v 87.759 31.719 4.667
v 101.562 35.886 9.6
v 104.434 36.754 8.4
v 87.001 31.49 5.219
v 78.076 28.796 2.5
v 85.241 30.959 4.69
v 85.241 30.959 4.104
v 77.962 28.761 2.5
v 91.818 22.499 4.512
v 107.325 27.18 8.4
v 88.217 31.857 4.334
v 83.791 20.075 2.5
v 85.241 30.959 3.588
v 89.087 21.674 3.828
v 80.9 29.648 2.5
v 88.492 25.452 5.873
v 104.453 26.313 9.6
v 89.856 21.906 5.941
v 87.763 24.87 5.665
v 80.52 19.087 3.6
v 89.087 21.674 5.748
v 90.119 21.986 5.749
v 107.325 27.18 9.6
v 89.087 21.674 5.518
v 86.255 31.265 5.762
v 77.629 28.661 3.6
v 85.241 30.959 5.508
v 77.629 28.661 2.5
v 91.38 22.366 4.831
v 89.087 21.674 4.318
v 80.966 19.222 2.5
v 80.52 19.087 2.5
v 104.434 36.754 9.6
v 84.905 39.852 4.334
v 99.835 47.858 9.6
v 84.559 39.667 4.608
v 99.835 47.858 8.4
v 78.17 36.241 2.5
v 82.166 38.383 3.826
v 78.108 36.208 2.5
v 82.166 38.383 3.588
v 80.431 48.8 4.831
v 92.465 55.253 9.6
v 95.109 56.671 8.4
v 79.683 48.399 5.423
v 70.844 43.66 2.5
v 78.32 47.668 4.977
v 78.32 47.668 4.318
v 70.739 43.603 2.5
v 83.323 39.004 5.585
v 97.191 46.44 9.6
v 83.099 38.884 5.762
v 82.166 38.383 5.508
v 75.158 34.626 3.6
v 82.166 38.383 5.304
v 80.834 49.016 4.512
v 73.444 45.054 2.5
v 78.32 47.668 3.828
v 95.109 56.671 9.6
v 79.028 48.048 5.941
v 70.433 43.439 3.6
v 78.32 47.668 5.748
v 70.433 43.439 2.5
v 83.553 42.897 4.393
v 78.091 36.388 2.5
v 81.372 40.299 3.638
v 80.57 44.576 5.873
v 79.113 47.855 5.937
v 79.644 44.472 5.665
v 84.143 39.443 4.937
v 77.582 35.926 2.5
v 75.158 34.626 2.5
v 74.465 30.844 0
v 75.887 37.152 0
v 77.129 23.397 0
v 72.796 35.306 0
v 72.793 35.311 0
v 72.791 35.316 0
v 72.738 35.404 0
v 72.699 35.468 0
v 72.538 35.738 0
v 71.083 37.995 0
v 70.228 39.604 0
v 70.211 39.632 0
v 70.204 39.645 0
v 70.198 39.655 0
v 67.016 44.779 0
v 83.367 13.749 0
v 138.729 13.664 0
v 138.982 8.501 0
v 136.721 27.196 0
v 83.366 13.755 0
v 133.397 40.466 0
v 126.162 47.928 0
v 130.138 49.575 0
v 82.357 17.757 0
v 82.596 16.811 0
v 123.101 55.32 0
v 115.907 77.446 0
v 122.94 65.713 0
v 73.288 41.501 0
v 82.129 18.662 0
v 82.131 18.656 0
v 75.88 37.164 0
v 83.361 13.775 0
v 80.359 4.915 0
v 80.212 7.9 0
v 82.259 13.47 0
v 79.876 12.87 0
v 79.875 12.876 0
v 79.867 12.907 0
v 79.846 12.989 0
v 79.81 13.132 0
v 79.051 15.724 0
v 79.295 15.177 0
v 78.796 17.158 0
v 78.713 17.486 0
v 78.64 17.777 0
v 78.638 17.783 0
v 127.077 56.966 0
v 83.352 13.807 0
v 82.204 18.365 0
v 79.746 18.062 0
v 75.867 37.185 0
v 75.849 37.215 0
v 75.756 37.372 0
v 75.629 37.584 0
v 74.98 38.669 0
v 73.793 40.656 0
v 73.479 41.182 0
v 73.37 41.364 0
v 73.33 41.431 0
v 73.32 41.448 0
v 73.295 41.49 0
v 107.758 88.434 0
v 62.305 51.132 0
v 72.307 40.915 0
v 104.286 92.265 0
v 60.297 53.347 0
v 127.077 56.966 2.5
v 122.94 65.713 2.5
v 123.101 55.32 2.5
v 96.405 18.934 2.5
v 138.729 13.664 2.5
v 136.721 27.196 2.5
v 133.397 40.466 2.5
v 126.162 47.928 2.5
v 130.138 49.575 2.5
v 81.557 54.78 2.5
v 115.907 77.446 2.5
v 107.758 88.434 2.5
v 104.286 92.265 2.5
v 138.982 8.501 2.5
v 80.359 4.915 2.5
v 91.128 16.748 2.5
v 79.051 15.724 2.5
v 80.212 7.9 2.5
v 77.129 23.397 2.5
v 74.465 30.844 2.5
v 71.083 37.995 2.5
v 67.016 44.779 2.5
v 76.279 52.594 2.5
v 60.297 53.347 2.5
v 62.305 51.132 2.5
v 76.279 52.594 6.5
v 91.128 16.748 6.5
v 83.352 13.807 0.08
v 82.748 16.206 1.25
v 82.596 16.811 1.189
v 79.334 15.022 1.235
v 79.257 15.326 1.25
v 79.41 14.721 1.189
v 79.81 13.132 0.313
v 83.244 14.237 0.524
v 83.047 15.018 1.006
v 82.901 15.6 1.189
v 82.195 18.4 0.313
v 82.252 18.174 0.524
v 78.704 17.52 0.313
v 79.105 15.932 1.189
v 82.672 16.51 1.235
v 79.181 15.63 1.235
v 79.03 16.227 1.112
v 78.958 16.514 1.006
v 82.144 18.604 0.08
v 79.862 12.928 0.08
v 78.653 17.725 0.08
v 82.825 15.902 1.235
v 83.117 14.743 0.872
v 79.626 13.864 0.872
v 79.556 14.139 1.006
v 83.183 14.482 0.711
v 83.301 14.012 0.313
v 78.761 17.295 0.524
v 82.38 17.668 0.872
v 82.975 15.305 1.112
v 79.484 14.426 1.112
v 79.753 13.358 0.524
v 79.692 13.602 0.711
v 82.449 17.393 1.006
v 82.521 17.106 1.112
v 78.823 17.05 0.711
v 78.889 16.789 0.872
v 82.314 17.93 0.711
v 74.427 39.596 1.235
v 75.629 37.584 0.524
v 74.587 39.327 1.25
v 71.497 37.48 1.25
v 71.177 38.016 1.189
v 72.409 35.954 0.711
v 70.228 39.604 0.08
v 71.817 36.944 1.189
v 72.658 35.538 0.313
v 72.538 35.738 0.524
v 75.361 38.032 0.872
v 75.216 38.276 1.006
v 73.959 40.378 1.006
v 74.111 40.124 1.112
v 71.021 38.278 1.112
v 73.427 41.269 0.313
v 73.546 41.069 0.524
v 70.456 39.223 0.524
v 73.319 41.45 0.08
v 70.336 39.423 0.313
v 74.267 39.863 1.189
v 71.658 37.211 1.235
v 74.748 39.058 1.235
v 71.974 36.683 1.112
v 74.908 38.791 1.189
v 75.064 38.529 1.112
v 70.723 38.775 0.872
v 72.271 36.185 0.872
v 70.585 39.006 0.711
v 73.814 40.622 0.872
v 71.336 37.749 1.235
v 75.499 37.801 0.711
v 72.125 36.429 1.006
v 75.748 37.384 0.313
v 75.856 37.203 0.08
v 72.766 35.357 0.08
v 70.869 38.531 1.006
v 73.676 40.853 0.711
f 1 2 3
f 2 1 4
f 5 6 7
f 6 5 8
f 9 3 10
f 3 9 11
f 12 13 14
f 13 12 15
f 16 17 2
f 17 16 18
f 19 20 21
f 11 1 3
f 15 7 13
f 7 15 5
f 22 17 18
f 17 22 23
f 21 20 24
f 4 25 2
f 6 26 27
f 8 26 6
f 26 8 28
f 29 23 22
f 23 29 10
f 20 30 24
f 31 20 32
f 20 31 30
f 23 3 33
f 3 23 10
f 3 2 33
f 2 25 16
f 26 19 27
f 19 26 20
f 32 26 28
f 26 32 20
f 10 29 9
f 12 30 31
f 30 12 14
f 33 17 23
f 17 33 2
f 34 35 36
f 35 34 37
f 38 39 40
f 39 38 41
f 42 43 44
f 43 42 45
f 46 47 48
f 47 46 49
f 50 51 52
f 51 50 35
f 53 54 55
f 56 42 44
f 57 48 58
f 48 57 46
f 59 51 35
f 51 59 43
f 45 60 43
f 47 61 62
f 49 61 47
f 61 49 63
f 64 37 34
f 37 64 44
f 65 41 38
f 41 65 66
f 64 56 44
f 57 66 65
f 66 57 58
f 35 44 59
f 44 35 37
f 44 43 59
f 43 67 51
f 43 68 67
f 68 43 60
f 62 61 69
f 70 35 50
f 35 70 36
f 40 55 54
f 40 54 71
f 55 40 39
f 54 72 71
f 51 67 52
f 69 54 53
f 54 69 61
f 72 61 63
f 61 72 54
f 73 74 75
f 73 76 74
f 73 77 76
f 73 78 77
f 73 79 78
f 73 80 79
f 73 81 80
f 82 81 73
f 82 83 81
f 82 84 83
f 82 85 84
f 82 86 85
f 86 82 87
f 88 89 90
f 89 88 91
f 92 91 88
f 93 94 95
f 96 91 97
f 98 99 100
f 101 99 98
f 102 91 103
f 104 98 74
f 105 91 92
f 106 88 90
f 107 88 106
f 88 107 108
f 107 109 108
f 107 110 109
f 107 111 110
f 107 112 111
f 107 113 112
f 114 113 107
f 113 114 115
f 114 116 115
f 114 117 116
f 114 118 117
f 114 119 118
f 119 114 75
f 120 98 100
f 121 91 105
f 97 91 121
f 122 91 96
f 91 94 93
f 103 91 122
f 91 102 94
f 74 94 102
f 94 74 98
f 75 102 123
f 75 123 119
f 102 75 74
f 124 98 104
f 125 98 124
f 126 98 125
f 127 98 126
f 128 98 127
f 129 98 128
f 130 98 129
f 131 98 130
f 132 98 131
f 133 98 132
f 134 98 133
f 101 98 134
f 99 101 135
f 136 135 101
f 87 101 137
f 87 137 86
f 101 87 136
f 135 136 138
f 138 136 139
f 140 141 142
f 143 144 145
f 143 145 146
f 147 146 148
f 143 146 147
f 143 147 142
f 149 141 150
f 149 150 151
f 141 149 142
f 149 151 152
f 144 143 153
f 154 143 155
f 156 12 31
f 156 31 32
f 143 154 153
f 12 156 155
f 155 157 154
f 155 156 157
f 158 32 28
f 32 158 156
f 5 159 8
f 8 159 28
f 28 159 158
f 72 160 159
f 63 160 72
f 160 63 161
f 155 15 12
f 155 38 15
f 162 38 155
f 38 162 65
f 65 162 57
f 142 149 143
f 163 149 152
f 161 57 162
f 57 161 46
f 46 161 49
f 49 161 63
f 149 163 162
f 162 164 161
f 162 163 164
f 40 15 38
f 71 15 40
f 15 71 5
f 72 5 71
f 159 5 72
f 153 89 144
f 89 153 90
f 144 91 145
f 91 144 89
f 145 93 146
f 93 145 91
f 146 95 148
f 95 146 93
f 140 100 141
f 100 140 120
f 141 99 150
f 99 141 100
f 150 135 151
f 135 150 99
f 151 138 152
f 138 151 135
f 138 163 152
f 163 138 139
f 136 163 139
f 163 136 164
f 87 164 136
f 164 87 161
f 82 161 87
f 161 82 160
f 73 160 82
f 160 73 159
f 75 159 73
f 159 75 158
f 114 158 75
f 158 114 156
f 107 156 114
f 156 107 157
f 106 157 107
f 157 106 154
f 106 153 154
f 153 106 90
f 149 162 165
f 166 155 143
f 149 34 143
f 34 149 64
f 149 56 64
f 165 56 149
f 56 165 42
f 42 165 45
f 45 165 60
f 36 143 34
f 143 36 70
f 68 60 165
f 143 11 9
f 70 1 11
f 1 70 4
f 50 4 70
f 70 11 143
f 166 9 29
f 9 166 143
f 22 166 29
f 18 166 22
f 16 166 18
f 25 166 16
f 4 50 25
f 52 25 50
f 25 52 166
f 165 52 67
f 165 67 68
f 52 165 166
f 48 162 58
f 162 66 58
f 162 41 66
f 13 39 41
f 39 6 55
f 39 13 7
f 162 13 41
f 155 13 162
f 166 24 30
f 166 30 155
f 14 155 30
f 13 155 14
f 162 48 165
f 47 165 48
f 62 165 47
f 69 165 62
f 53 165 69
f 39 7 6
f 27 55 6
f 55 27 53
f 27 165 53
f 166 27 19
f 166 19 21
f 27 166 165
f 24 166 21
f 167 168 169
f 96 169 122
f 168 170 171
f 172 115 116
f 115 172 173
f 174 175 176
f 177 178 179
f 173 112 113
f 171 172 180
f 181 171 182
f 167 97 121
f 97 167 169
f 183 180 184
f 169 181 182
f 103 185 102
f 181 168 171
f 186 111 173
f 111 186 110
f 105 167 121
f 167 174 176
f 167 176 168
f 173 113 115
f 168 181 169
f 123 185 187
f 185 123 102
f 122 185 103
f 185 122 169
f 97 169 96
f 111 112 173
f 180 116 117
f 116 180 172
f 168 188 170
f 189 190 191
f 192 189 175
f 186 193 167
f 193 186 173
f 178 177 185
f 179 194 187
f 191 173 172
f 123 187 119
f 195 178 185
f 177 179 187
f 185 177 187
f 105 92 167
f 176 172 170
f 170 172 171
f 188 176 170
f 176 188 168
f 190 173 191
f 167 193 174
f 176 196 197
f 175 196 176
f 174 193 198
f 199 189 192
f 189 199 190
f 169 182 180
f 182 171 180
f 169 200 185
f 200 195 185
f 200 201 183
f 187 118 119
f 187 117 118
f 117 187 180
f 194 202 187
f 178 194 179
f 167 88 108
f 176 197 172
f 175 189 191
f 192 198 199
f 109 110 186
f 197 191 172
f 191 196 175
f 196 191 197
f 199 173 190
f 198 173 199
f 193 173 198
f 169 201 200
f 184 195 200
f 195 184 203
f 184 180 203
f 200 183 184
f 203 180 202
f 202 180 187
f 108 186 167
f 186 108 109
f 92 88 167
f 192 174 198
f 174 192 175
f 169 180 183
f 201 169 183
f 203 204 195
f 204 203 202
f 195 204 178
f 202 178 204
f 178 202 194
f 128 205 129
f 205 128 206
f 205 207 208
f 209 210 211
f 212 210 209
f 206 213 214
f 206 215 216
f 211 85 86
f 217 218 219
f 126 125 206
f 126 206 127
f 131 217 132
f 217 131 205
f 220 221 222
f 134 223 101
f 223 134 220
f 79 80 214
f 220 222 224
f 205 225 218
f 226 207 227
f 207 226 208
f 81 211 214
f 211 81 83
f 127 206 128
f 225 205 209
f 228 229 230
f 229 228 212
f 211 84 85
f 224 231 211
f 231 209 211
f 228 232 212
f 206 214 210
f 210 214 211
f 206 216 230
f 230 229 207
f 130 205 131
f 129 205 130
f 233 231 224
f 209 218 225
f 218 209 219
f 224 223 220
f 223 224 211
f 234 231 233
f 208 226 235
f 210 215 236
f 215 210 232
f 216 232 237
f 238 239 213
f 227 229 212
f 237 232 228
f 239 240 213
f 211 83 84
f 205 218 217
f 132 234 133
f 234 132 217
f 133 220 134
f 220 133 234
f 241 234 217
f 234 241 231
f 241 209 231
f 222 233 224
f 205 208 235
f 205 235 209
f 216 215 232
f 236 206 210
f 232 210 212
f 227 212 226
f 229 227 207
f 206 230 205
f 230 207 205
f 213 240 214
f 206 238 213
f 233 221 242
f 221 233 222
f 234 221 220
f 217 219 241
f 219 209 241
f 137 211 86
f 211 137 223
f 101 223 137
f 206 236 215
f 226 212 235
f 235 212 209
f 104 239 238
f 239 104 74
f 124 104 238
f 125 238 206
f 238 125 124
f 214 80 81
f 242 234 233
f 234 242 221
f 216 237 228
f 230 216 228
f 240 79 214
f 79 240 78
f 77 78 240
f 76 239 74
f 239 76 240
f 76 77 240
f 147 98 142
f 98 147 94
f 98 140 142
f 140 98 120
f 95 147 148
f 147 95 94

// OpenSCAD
// ═══════════════════════════════════════════════════════════════════════
//  CowPad — Ejector Platform  ·  V2 Print-in-Place Spring
//  ENGN676  ·  Lincoln University  ·  2026
//
//  PRINTS AS ONE PIECE — no separate spring needed.
//
//  HOW IT WORKS:
//    1. Two leaf spring arms grow from the top face near the inner edge.
//    2. Arms naturally rise 6mm above platform surface (printed at an angle).
//    3. Push platform flat into tile cavity → ceiling compresses arms 2mm
//       → spring loaded (~4 N total force).
//    4. Trigger releases latch → arms spring back → OR edge flips up
//       → cartridge launches toward paddock.
//    5. Next cartridge drops from magazine. Reset manually for demo.
//
//  HINGE: two U-channels hook over pins projecting from tile inner wall.
//  Assembly: angle platform → hook channels over pins → press flat.
//
//  ► PRINT 1 COPY
//  ► Orientation : FLAT FACE DOWN (arms print pointing upward — no supports)
//  ► Layer height : 0.2mm
//  ► Infill       : 25%
//  ► Supports     : NONE
//  ► Material     : PLA  (~15 reliable flex cycles for demo)
//                   PETG preferred if available (100+ cycles)
//  ► Est. time    : ~1 hr
// ═══════════════════════════════════════════════════════════════════════

$fn = 64;

// ── Tile cavity parameters (must match cowpad_tile_arc.scad) ─────────
IR = 75;   OR = 145;   ANG = 45;
BASE_H = 6;   FILL_H = 8;   LID_H = 1.5;
CAV_WALL = 5;   CAV_ANG = 3;
CAV_DEPTH = FILL_H - LID_H;   // 6.5mm usable cavity depth

// ── Platform footprint ───────────────────────────────────────────────
P_IR  = IR  + CAV_WALL + 0.6;   // 80.6
P_OR  = OR  - CAV_WALL - 0.6;   // 139.4
P_A1  = CAV_ANG + 0.5;          // 3.5°
P_A2  = ANG - CAV_ANG - 0.5;    // 41.5°
P_H   = 2.5;                     // base plate thickness

// ── Hinge U-channels ─────────────────────────────────────────────────
HG_D    = 6.4;   // pin Ø + 0.4mm clearance
HG_DEEP = 3.5;
HG_L    = 9;
HG_A    = [P_A1 + (P_A2-P_A1)*0.28, P_A1 + (P_A2-P_A1)*0.72];

// ── Print-in-Place Leaf Spring Arms ──────────────────────────────────
//
//  Arm geometry (side view, IR at left, OR at right):
//
//                                tip ___
//                               /      |  } LEAF_T = 1.2mm
//                         ____/________|
//    base ____           |  arm        |
//    _____|    |__________|_____________|
//    |  platform body P_H = 2.5mm      |
//    |__________________________________|
//    IR edge (hinge)             OR edge
//
//  Base (at P_IR+2) is bonded to platform.
//  Tip (at P_IR+2+LEAF_L) rises LEAF_RISE above platform top.
//  Cavity clearance above platform = CAV_DEPTH - P_H = 4.0mm.
//  LEAF_RISE = 6mm → tip 2mm above ceiling in free state
//  → arm compressed 2mm when installed → ~4 N spring force.
//
LEAF_T    = 1.2;   // arm thickness — printable with 0.4mm nozzle (3 perimeters)
LEAF_W    = 10;    // arm width (arc direction)
LEAF_L    = 25;    // arm radial length (cantilever span)
LEAF_BASE = 3;     // bonded base section length
LEAF_RISE = 6.0;   // tip height above platform top in free state (> 4mm clearance)

// Two arms at 35% and 65% of arc span
LEAF_A = [P_A1 + (P_A2-P_A1)*0.35, P_A1 + (P_A2-P_A1)*0.65];

// ── Latch notch ──────────────────────────────────────────────────────
LT_W   = 8;   LT_H = 4;   LT_D = 3.5;
LT_ANG = (P_A1 + P_A2) / 2;

// ── Launch ramp ───────────────────────────────────────────────────────
RAMP_ANG = 35;
RAMP_H   = 4;
RAMP_W   = P_OR - P_IR - 20;

// ═══════════════════════════════════════════════════════════════════════
// HELPERS
// ═══════════════════════════════════════════════════════════════════════

module pie_2d(r, a1, a2) {
  steps = max(4, ceil(a2 - a1));
  pts = concat([[0,0]],
    [for(i=[0:steps])
      [r*cos(a1 + i*(a2-a1)/steps),
       r*sin(a1 + i*(a2-a1)/steps)]]);
  polygon(pts);
}

module ring_sector_2d(ri, ro, a1, a2) {
  intersection() {
    difference() { circle(ro); circle(ri); }
    pie_2d(ro+1, a1, a2);
  }
}

module ring_sector(ri, ro, a1, a2, h) {
  linear_extrude(h) ring_sector_2d(ri, ro, a1, a2);
}

// ═══════════════════════════════════════════════════════════════════════
// HINGE U-CHANNELS
// Cut into inner radius edge of platform — hook over tile hinge pins.
// ═══════════════════════════════════════════════════════════════════════

module hinge_channels() {
  for(a = HG_A) {
    rotate([0,0,a])
      translate([P_IR, -HG_L/2, P_H/2 - HG_D/2])
        rotate([0,90,0])
          cylinder(d=HG_D, h=HG_DEEP+0.1);
  }
}

// ═══════════════════════════════════════════════════════════════════════
// PRINT-IN-PLACE LEAF SPRING ARMS
//
// hull() between two flat blocks creates a tapered angled beam:
//   block 1 (base): at platform top face, near P_IR — stays flat
//   block 2 (tip):  translated radially outward AND up by LEAF_RISE
// Result: arm rises from flat at IR end to LEAF_RISE at tip end.
//
// Orientation note: with flat-face-DOWN printing, the arms print
// pointing UP — no overhangs, no supports needed.
// ═══════════════════════════════════════════════════════════════════════

module leaf_spring_arms() {
  for(a = LEAF_A) {
    rotate([0, 0, a])
      translate([P_IR + 2, -LEAF_W/2, P_H - 0.1])
        hull() {
          cube([LEAF_BASE, LEAF_W, LEAF_T]);                 // base block (flat)
          translate([LEAF_L, 0, LEAF_RISE])                  // tip block (raised)
            cube([LEAF_BASE, LEAF_W, LEAF_T]);
        }
  }
}

// ═══════════════════════════════════════════════════════════════════════
// LATCH NOTCH
// Rectangular pocket on underside near OR edge — trigger hook catches here.
// ═══════════════════════════════════════════════════════════════════════

module latch_notch_cut() {
  rotate([0,0,LT_ANG])
    translate([P_OR - LT_D - 1, -LT_W/2, -0.1])
      cube([LT_D + 1.1, LT_W, LT_H + 0.1]);
}

// ═══════════════════════════════════════════════════════════════════════
// LAUNCH RAMP
// Wedge on top face guides cartridge at 35° elevation on ejection.
// ═══════════════════════════════════════════════════════════════════════

module launch_ramp() {
  a_mid = (P_A1 + P_A2) / 2;
  rotate([0,0,a_mid])
    translate([P_IR + 10, RAMP_W/2, P_H])
      rotate([90,0,0])
        linear_extrude(RAMP_W)
          polygon([
            [0, 0],
            [RAMP_H / tan(RAMP_ANG), 0],
            [0, RAMP_H]
          ]);
}

// ═══════════════════════════════════════════════════════════════════════
// ASSEMBLE
// ═══════════════════════════════════════════════════════════════════════

difference() {
  union() {
    ring_sector(P_IR, P_OR, P_A1, P_A2, P_H);   // base plate
    leaf_spring_arms();                            // integrated PIP spring
    launch_ramp();
  }
  hinge_channels();
  latch_notch_cut();
}
